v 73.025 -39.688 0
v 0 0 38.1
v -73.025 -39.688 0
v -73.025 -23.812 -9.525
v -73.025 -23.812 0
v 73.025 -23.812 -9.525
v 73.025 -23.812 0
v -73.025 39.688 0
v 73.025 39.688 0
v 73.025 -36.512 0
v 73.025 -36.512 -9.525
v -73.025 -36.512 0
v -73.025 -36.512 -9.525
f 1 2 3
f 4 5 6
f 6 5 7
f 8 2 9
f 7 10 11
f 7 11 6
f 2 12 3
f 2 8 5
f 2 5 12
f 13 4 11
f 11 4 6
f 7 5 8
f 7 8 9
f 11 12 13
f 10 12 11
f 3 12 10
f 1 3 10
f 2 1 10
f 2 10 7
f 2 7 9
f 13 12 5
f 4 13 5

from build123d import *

# Parameters (mm, degrees)
F0_W     = 146.05
F0_H     = 79.375
F5_W     = 146.05
F5_H     = 12.7
F6_DEPTH = 9.525


with BuildPart() as f3:
    # F0 (on Top) → F3 section 0
    with BuildSketch(Plane.XY, mode=Mode.PRIVATE) as f3_s0:
        Rectangle(F0_W, F0_H)
    loft([f3_s0.sketch, Vertex(0, 0, 38.1)])

    # F5 (on offset) → F6 (join)
    with BuildSketch(Plane.XY):
        with Locations((0, -30.1625)):
            Rectangle(F5_W, F5_H)
    extrude(amount=-F6_DEPTH)


solid = f3.part
